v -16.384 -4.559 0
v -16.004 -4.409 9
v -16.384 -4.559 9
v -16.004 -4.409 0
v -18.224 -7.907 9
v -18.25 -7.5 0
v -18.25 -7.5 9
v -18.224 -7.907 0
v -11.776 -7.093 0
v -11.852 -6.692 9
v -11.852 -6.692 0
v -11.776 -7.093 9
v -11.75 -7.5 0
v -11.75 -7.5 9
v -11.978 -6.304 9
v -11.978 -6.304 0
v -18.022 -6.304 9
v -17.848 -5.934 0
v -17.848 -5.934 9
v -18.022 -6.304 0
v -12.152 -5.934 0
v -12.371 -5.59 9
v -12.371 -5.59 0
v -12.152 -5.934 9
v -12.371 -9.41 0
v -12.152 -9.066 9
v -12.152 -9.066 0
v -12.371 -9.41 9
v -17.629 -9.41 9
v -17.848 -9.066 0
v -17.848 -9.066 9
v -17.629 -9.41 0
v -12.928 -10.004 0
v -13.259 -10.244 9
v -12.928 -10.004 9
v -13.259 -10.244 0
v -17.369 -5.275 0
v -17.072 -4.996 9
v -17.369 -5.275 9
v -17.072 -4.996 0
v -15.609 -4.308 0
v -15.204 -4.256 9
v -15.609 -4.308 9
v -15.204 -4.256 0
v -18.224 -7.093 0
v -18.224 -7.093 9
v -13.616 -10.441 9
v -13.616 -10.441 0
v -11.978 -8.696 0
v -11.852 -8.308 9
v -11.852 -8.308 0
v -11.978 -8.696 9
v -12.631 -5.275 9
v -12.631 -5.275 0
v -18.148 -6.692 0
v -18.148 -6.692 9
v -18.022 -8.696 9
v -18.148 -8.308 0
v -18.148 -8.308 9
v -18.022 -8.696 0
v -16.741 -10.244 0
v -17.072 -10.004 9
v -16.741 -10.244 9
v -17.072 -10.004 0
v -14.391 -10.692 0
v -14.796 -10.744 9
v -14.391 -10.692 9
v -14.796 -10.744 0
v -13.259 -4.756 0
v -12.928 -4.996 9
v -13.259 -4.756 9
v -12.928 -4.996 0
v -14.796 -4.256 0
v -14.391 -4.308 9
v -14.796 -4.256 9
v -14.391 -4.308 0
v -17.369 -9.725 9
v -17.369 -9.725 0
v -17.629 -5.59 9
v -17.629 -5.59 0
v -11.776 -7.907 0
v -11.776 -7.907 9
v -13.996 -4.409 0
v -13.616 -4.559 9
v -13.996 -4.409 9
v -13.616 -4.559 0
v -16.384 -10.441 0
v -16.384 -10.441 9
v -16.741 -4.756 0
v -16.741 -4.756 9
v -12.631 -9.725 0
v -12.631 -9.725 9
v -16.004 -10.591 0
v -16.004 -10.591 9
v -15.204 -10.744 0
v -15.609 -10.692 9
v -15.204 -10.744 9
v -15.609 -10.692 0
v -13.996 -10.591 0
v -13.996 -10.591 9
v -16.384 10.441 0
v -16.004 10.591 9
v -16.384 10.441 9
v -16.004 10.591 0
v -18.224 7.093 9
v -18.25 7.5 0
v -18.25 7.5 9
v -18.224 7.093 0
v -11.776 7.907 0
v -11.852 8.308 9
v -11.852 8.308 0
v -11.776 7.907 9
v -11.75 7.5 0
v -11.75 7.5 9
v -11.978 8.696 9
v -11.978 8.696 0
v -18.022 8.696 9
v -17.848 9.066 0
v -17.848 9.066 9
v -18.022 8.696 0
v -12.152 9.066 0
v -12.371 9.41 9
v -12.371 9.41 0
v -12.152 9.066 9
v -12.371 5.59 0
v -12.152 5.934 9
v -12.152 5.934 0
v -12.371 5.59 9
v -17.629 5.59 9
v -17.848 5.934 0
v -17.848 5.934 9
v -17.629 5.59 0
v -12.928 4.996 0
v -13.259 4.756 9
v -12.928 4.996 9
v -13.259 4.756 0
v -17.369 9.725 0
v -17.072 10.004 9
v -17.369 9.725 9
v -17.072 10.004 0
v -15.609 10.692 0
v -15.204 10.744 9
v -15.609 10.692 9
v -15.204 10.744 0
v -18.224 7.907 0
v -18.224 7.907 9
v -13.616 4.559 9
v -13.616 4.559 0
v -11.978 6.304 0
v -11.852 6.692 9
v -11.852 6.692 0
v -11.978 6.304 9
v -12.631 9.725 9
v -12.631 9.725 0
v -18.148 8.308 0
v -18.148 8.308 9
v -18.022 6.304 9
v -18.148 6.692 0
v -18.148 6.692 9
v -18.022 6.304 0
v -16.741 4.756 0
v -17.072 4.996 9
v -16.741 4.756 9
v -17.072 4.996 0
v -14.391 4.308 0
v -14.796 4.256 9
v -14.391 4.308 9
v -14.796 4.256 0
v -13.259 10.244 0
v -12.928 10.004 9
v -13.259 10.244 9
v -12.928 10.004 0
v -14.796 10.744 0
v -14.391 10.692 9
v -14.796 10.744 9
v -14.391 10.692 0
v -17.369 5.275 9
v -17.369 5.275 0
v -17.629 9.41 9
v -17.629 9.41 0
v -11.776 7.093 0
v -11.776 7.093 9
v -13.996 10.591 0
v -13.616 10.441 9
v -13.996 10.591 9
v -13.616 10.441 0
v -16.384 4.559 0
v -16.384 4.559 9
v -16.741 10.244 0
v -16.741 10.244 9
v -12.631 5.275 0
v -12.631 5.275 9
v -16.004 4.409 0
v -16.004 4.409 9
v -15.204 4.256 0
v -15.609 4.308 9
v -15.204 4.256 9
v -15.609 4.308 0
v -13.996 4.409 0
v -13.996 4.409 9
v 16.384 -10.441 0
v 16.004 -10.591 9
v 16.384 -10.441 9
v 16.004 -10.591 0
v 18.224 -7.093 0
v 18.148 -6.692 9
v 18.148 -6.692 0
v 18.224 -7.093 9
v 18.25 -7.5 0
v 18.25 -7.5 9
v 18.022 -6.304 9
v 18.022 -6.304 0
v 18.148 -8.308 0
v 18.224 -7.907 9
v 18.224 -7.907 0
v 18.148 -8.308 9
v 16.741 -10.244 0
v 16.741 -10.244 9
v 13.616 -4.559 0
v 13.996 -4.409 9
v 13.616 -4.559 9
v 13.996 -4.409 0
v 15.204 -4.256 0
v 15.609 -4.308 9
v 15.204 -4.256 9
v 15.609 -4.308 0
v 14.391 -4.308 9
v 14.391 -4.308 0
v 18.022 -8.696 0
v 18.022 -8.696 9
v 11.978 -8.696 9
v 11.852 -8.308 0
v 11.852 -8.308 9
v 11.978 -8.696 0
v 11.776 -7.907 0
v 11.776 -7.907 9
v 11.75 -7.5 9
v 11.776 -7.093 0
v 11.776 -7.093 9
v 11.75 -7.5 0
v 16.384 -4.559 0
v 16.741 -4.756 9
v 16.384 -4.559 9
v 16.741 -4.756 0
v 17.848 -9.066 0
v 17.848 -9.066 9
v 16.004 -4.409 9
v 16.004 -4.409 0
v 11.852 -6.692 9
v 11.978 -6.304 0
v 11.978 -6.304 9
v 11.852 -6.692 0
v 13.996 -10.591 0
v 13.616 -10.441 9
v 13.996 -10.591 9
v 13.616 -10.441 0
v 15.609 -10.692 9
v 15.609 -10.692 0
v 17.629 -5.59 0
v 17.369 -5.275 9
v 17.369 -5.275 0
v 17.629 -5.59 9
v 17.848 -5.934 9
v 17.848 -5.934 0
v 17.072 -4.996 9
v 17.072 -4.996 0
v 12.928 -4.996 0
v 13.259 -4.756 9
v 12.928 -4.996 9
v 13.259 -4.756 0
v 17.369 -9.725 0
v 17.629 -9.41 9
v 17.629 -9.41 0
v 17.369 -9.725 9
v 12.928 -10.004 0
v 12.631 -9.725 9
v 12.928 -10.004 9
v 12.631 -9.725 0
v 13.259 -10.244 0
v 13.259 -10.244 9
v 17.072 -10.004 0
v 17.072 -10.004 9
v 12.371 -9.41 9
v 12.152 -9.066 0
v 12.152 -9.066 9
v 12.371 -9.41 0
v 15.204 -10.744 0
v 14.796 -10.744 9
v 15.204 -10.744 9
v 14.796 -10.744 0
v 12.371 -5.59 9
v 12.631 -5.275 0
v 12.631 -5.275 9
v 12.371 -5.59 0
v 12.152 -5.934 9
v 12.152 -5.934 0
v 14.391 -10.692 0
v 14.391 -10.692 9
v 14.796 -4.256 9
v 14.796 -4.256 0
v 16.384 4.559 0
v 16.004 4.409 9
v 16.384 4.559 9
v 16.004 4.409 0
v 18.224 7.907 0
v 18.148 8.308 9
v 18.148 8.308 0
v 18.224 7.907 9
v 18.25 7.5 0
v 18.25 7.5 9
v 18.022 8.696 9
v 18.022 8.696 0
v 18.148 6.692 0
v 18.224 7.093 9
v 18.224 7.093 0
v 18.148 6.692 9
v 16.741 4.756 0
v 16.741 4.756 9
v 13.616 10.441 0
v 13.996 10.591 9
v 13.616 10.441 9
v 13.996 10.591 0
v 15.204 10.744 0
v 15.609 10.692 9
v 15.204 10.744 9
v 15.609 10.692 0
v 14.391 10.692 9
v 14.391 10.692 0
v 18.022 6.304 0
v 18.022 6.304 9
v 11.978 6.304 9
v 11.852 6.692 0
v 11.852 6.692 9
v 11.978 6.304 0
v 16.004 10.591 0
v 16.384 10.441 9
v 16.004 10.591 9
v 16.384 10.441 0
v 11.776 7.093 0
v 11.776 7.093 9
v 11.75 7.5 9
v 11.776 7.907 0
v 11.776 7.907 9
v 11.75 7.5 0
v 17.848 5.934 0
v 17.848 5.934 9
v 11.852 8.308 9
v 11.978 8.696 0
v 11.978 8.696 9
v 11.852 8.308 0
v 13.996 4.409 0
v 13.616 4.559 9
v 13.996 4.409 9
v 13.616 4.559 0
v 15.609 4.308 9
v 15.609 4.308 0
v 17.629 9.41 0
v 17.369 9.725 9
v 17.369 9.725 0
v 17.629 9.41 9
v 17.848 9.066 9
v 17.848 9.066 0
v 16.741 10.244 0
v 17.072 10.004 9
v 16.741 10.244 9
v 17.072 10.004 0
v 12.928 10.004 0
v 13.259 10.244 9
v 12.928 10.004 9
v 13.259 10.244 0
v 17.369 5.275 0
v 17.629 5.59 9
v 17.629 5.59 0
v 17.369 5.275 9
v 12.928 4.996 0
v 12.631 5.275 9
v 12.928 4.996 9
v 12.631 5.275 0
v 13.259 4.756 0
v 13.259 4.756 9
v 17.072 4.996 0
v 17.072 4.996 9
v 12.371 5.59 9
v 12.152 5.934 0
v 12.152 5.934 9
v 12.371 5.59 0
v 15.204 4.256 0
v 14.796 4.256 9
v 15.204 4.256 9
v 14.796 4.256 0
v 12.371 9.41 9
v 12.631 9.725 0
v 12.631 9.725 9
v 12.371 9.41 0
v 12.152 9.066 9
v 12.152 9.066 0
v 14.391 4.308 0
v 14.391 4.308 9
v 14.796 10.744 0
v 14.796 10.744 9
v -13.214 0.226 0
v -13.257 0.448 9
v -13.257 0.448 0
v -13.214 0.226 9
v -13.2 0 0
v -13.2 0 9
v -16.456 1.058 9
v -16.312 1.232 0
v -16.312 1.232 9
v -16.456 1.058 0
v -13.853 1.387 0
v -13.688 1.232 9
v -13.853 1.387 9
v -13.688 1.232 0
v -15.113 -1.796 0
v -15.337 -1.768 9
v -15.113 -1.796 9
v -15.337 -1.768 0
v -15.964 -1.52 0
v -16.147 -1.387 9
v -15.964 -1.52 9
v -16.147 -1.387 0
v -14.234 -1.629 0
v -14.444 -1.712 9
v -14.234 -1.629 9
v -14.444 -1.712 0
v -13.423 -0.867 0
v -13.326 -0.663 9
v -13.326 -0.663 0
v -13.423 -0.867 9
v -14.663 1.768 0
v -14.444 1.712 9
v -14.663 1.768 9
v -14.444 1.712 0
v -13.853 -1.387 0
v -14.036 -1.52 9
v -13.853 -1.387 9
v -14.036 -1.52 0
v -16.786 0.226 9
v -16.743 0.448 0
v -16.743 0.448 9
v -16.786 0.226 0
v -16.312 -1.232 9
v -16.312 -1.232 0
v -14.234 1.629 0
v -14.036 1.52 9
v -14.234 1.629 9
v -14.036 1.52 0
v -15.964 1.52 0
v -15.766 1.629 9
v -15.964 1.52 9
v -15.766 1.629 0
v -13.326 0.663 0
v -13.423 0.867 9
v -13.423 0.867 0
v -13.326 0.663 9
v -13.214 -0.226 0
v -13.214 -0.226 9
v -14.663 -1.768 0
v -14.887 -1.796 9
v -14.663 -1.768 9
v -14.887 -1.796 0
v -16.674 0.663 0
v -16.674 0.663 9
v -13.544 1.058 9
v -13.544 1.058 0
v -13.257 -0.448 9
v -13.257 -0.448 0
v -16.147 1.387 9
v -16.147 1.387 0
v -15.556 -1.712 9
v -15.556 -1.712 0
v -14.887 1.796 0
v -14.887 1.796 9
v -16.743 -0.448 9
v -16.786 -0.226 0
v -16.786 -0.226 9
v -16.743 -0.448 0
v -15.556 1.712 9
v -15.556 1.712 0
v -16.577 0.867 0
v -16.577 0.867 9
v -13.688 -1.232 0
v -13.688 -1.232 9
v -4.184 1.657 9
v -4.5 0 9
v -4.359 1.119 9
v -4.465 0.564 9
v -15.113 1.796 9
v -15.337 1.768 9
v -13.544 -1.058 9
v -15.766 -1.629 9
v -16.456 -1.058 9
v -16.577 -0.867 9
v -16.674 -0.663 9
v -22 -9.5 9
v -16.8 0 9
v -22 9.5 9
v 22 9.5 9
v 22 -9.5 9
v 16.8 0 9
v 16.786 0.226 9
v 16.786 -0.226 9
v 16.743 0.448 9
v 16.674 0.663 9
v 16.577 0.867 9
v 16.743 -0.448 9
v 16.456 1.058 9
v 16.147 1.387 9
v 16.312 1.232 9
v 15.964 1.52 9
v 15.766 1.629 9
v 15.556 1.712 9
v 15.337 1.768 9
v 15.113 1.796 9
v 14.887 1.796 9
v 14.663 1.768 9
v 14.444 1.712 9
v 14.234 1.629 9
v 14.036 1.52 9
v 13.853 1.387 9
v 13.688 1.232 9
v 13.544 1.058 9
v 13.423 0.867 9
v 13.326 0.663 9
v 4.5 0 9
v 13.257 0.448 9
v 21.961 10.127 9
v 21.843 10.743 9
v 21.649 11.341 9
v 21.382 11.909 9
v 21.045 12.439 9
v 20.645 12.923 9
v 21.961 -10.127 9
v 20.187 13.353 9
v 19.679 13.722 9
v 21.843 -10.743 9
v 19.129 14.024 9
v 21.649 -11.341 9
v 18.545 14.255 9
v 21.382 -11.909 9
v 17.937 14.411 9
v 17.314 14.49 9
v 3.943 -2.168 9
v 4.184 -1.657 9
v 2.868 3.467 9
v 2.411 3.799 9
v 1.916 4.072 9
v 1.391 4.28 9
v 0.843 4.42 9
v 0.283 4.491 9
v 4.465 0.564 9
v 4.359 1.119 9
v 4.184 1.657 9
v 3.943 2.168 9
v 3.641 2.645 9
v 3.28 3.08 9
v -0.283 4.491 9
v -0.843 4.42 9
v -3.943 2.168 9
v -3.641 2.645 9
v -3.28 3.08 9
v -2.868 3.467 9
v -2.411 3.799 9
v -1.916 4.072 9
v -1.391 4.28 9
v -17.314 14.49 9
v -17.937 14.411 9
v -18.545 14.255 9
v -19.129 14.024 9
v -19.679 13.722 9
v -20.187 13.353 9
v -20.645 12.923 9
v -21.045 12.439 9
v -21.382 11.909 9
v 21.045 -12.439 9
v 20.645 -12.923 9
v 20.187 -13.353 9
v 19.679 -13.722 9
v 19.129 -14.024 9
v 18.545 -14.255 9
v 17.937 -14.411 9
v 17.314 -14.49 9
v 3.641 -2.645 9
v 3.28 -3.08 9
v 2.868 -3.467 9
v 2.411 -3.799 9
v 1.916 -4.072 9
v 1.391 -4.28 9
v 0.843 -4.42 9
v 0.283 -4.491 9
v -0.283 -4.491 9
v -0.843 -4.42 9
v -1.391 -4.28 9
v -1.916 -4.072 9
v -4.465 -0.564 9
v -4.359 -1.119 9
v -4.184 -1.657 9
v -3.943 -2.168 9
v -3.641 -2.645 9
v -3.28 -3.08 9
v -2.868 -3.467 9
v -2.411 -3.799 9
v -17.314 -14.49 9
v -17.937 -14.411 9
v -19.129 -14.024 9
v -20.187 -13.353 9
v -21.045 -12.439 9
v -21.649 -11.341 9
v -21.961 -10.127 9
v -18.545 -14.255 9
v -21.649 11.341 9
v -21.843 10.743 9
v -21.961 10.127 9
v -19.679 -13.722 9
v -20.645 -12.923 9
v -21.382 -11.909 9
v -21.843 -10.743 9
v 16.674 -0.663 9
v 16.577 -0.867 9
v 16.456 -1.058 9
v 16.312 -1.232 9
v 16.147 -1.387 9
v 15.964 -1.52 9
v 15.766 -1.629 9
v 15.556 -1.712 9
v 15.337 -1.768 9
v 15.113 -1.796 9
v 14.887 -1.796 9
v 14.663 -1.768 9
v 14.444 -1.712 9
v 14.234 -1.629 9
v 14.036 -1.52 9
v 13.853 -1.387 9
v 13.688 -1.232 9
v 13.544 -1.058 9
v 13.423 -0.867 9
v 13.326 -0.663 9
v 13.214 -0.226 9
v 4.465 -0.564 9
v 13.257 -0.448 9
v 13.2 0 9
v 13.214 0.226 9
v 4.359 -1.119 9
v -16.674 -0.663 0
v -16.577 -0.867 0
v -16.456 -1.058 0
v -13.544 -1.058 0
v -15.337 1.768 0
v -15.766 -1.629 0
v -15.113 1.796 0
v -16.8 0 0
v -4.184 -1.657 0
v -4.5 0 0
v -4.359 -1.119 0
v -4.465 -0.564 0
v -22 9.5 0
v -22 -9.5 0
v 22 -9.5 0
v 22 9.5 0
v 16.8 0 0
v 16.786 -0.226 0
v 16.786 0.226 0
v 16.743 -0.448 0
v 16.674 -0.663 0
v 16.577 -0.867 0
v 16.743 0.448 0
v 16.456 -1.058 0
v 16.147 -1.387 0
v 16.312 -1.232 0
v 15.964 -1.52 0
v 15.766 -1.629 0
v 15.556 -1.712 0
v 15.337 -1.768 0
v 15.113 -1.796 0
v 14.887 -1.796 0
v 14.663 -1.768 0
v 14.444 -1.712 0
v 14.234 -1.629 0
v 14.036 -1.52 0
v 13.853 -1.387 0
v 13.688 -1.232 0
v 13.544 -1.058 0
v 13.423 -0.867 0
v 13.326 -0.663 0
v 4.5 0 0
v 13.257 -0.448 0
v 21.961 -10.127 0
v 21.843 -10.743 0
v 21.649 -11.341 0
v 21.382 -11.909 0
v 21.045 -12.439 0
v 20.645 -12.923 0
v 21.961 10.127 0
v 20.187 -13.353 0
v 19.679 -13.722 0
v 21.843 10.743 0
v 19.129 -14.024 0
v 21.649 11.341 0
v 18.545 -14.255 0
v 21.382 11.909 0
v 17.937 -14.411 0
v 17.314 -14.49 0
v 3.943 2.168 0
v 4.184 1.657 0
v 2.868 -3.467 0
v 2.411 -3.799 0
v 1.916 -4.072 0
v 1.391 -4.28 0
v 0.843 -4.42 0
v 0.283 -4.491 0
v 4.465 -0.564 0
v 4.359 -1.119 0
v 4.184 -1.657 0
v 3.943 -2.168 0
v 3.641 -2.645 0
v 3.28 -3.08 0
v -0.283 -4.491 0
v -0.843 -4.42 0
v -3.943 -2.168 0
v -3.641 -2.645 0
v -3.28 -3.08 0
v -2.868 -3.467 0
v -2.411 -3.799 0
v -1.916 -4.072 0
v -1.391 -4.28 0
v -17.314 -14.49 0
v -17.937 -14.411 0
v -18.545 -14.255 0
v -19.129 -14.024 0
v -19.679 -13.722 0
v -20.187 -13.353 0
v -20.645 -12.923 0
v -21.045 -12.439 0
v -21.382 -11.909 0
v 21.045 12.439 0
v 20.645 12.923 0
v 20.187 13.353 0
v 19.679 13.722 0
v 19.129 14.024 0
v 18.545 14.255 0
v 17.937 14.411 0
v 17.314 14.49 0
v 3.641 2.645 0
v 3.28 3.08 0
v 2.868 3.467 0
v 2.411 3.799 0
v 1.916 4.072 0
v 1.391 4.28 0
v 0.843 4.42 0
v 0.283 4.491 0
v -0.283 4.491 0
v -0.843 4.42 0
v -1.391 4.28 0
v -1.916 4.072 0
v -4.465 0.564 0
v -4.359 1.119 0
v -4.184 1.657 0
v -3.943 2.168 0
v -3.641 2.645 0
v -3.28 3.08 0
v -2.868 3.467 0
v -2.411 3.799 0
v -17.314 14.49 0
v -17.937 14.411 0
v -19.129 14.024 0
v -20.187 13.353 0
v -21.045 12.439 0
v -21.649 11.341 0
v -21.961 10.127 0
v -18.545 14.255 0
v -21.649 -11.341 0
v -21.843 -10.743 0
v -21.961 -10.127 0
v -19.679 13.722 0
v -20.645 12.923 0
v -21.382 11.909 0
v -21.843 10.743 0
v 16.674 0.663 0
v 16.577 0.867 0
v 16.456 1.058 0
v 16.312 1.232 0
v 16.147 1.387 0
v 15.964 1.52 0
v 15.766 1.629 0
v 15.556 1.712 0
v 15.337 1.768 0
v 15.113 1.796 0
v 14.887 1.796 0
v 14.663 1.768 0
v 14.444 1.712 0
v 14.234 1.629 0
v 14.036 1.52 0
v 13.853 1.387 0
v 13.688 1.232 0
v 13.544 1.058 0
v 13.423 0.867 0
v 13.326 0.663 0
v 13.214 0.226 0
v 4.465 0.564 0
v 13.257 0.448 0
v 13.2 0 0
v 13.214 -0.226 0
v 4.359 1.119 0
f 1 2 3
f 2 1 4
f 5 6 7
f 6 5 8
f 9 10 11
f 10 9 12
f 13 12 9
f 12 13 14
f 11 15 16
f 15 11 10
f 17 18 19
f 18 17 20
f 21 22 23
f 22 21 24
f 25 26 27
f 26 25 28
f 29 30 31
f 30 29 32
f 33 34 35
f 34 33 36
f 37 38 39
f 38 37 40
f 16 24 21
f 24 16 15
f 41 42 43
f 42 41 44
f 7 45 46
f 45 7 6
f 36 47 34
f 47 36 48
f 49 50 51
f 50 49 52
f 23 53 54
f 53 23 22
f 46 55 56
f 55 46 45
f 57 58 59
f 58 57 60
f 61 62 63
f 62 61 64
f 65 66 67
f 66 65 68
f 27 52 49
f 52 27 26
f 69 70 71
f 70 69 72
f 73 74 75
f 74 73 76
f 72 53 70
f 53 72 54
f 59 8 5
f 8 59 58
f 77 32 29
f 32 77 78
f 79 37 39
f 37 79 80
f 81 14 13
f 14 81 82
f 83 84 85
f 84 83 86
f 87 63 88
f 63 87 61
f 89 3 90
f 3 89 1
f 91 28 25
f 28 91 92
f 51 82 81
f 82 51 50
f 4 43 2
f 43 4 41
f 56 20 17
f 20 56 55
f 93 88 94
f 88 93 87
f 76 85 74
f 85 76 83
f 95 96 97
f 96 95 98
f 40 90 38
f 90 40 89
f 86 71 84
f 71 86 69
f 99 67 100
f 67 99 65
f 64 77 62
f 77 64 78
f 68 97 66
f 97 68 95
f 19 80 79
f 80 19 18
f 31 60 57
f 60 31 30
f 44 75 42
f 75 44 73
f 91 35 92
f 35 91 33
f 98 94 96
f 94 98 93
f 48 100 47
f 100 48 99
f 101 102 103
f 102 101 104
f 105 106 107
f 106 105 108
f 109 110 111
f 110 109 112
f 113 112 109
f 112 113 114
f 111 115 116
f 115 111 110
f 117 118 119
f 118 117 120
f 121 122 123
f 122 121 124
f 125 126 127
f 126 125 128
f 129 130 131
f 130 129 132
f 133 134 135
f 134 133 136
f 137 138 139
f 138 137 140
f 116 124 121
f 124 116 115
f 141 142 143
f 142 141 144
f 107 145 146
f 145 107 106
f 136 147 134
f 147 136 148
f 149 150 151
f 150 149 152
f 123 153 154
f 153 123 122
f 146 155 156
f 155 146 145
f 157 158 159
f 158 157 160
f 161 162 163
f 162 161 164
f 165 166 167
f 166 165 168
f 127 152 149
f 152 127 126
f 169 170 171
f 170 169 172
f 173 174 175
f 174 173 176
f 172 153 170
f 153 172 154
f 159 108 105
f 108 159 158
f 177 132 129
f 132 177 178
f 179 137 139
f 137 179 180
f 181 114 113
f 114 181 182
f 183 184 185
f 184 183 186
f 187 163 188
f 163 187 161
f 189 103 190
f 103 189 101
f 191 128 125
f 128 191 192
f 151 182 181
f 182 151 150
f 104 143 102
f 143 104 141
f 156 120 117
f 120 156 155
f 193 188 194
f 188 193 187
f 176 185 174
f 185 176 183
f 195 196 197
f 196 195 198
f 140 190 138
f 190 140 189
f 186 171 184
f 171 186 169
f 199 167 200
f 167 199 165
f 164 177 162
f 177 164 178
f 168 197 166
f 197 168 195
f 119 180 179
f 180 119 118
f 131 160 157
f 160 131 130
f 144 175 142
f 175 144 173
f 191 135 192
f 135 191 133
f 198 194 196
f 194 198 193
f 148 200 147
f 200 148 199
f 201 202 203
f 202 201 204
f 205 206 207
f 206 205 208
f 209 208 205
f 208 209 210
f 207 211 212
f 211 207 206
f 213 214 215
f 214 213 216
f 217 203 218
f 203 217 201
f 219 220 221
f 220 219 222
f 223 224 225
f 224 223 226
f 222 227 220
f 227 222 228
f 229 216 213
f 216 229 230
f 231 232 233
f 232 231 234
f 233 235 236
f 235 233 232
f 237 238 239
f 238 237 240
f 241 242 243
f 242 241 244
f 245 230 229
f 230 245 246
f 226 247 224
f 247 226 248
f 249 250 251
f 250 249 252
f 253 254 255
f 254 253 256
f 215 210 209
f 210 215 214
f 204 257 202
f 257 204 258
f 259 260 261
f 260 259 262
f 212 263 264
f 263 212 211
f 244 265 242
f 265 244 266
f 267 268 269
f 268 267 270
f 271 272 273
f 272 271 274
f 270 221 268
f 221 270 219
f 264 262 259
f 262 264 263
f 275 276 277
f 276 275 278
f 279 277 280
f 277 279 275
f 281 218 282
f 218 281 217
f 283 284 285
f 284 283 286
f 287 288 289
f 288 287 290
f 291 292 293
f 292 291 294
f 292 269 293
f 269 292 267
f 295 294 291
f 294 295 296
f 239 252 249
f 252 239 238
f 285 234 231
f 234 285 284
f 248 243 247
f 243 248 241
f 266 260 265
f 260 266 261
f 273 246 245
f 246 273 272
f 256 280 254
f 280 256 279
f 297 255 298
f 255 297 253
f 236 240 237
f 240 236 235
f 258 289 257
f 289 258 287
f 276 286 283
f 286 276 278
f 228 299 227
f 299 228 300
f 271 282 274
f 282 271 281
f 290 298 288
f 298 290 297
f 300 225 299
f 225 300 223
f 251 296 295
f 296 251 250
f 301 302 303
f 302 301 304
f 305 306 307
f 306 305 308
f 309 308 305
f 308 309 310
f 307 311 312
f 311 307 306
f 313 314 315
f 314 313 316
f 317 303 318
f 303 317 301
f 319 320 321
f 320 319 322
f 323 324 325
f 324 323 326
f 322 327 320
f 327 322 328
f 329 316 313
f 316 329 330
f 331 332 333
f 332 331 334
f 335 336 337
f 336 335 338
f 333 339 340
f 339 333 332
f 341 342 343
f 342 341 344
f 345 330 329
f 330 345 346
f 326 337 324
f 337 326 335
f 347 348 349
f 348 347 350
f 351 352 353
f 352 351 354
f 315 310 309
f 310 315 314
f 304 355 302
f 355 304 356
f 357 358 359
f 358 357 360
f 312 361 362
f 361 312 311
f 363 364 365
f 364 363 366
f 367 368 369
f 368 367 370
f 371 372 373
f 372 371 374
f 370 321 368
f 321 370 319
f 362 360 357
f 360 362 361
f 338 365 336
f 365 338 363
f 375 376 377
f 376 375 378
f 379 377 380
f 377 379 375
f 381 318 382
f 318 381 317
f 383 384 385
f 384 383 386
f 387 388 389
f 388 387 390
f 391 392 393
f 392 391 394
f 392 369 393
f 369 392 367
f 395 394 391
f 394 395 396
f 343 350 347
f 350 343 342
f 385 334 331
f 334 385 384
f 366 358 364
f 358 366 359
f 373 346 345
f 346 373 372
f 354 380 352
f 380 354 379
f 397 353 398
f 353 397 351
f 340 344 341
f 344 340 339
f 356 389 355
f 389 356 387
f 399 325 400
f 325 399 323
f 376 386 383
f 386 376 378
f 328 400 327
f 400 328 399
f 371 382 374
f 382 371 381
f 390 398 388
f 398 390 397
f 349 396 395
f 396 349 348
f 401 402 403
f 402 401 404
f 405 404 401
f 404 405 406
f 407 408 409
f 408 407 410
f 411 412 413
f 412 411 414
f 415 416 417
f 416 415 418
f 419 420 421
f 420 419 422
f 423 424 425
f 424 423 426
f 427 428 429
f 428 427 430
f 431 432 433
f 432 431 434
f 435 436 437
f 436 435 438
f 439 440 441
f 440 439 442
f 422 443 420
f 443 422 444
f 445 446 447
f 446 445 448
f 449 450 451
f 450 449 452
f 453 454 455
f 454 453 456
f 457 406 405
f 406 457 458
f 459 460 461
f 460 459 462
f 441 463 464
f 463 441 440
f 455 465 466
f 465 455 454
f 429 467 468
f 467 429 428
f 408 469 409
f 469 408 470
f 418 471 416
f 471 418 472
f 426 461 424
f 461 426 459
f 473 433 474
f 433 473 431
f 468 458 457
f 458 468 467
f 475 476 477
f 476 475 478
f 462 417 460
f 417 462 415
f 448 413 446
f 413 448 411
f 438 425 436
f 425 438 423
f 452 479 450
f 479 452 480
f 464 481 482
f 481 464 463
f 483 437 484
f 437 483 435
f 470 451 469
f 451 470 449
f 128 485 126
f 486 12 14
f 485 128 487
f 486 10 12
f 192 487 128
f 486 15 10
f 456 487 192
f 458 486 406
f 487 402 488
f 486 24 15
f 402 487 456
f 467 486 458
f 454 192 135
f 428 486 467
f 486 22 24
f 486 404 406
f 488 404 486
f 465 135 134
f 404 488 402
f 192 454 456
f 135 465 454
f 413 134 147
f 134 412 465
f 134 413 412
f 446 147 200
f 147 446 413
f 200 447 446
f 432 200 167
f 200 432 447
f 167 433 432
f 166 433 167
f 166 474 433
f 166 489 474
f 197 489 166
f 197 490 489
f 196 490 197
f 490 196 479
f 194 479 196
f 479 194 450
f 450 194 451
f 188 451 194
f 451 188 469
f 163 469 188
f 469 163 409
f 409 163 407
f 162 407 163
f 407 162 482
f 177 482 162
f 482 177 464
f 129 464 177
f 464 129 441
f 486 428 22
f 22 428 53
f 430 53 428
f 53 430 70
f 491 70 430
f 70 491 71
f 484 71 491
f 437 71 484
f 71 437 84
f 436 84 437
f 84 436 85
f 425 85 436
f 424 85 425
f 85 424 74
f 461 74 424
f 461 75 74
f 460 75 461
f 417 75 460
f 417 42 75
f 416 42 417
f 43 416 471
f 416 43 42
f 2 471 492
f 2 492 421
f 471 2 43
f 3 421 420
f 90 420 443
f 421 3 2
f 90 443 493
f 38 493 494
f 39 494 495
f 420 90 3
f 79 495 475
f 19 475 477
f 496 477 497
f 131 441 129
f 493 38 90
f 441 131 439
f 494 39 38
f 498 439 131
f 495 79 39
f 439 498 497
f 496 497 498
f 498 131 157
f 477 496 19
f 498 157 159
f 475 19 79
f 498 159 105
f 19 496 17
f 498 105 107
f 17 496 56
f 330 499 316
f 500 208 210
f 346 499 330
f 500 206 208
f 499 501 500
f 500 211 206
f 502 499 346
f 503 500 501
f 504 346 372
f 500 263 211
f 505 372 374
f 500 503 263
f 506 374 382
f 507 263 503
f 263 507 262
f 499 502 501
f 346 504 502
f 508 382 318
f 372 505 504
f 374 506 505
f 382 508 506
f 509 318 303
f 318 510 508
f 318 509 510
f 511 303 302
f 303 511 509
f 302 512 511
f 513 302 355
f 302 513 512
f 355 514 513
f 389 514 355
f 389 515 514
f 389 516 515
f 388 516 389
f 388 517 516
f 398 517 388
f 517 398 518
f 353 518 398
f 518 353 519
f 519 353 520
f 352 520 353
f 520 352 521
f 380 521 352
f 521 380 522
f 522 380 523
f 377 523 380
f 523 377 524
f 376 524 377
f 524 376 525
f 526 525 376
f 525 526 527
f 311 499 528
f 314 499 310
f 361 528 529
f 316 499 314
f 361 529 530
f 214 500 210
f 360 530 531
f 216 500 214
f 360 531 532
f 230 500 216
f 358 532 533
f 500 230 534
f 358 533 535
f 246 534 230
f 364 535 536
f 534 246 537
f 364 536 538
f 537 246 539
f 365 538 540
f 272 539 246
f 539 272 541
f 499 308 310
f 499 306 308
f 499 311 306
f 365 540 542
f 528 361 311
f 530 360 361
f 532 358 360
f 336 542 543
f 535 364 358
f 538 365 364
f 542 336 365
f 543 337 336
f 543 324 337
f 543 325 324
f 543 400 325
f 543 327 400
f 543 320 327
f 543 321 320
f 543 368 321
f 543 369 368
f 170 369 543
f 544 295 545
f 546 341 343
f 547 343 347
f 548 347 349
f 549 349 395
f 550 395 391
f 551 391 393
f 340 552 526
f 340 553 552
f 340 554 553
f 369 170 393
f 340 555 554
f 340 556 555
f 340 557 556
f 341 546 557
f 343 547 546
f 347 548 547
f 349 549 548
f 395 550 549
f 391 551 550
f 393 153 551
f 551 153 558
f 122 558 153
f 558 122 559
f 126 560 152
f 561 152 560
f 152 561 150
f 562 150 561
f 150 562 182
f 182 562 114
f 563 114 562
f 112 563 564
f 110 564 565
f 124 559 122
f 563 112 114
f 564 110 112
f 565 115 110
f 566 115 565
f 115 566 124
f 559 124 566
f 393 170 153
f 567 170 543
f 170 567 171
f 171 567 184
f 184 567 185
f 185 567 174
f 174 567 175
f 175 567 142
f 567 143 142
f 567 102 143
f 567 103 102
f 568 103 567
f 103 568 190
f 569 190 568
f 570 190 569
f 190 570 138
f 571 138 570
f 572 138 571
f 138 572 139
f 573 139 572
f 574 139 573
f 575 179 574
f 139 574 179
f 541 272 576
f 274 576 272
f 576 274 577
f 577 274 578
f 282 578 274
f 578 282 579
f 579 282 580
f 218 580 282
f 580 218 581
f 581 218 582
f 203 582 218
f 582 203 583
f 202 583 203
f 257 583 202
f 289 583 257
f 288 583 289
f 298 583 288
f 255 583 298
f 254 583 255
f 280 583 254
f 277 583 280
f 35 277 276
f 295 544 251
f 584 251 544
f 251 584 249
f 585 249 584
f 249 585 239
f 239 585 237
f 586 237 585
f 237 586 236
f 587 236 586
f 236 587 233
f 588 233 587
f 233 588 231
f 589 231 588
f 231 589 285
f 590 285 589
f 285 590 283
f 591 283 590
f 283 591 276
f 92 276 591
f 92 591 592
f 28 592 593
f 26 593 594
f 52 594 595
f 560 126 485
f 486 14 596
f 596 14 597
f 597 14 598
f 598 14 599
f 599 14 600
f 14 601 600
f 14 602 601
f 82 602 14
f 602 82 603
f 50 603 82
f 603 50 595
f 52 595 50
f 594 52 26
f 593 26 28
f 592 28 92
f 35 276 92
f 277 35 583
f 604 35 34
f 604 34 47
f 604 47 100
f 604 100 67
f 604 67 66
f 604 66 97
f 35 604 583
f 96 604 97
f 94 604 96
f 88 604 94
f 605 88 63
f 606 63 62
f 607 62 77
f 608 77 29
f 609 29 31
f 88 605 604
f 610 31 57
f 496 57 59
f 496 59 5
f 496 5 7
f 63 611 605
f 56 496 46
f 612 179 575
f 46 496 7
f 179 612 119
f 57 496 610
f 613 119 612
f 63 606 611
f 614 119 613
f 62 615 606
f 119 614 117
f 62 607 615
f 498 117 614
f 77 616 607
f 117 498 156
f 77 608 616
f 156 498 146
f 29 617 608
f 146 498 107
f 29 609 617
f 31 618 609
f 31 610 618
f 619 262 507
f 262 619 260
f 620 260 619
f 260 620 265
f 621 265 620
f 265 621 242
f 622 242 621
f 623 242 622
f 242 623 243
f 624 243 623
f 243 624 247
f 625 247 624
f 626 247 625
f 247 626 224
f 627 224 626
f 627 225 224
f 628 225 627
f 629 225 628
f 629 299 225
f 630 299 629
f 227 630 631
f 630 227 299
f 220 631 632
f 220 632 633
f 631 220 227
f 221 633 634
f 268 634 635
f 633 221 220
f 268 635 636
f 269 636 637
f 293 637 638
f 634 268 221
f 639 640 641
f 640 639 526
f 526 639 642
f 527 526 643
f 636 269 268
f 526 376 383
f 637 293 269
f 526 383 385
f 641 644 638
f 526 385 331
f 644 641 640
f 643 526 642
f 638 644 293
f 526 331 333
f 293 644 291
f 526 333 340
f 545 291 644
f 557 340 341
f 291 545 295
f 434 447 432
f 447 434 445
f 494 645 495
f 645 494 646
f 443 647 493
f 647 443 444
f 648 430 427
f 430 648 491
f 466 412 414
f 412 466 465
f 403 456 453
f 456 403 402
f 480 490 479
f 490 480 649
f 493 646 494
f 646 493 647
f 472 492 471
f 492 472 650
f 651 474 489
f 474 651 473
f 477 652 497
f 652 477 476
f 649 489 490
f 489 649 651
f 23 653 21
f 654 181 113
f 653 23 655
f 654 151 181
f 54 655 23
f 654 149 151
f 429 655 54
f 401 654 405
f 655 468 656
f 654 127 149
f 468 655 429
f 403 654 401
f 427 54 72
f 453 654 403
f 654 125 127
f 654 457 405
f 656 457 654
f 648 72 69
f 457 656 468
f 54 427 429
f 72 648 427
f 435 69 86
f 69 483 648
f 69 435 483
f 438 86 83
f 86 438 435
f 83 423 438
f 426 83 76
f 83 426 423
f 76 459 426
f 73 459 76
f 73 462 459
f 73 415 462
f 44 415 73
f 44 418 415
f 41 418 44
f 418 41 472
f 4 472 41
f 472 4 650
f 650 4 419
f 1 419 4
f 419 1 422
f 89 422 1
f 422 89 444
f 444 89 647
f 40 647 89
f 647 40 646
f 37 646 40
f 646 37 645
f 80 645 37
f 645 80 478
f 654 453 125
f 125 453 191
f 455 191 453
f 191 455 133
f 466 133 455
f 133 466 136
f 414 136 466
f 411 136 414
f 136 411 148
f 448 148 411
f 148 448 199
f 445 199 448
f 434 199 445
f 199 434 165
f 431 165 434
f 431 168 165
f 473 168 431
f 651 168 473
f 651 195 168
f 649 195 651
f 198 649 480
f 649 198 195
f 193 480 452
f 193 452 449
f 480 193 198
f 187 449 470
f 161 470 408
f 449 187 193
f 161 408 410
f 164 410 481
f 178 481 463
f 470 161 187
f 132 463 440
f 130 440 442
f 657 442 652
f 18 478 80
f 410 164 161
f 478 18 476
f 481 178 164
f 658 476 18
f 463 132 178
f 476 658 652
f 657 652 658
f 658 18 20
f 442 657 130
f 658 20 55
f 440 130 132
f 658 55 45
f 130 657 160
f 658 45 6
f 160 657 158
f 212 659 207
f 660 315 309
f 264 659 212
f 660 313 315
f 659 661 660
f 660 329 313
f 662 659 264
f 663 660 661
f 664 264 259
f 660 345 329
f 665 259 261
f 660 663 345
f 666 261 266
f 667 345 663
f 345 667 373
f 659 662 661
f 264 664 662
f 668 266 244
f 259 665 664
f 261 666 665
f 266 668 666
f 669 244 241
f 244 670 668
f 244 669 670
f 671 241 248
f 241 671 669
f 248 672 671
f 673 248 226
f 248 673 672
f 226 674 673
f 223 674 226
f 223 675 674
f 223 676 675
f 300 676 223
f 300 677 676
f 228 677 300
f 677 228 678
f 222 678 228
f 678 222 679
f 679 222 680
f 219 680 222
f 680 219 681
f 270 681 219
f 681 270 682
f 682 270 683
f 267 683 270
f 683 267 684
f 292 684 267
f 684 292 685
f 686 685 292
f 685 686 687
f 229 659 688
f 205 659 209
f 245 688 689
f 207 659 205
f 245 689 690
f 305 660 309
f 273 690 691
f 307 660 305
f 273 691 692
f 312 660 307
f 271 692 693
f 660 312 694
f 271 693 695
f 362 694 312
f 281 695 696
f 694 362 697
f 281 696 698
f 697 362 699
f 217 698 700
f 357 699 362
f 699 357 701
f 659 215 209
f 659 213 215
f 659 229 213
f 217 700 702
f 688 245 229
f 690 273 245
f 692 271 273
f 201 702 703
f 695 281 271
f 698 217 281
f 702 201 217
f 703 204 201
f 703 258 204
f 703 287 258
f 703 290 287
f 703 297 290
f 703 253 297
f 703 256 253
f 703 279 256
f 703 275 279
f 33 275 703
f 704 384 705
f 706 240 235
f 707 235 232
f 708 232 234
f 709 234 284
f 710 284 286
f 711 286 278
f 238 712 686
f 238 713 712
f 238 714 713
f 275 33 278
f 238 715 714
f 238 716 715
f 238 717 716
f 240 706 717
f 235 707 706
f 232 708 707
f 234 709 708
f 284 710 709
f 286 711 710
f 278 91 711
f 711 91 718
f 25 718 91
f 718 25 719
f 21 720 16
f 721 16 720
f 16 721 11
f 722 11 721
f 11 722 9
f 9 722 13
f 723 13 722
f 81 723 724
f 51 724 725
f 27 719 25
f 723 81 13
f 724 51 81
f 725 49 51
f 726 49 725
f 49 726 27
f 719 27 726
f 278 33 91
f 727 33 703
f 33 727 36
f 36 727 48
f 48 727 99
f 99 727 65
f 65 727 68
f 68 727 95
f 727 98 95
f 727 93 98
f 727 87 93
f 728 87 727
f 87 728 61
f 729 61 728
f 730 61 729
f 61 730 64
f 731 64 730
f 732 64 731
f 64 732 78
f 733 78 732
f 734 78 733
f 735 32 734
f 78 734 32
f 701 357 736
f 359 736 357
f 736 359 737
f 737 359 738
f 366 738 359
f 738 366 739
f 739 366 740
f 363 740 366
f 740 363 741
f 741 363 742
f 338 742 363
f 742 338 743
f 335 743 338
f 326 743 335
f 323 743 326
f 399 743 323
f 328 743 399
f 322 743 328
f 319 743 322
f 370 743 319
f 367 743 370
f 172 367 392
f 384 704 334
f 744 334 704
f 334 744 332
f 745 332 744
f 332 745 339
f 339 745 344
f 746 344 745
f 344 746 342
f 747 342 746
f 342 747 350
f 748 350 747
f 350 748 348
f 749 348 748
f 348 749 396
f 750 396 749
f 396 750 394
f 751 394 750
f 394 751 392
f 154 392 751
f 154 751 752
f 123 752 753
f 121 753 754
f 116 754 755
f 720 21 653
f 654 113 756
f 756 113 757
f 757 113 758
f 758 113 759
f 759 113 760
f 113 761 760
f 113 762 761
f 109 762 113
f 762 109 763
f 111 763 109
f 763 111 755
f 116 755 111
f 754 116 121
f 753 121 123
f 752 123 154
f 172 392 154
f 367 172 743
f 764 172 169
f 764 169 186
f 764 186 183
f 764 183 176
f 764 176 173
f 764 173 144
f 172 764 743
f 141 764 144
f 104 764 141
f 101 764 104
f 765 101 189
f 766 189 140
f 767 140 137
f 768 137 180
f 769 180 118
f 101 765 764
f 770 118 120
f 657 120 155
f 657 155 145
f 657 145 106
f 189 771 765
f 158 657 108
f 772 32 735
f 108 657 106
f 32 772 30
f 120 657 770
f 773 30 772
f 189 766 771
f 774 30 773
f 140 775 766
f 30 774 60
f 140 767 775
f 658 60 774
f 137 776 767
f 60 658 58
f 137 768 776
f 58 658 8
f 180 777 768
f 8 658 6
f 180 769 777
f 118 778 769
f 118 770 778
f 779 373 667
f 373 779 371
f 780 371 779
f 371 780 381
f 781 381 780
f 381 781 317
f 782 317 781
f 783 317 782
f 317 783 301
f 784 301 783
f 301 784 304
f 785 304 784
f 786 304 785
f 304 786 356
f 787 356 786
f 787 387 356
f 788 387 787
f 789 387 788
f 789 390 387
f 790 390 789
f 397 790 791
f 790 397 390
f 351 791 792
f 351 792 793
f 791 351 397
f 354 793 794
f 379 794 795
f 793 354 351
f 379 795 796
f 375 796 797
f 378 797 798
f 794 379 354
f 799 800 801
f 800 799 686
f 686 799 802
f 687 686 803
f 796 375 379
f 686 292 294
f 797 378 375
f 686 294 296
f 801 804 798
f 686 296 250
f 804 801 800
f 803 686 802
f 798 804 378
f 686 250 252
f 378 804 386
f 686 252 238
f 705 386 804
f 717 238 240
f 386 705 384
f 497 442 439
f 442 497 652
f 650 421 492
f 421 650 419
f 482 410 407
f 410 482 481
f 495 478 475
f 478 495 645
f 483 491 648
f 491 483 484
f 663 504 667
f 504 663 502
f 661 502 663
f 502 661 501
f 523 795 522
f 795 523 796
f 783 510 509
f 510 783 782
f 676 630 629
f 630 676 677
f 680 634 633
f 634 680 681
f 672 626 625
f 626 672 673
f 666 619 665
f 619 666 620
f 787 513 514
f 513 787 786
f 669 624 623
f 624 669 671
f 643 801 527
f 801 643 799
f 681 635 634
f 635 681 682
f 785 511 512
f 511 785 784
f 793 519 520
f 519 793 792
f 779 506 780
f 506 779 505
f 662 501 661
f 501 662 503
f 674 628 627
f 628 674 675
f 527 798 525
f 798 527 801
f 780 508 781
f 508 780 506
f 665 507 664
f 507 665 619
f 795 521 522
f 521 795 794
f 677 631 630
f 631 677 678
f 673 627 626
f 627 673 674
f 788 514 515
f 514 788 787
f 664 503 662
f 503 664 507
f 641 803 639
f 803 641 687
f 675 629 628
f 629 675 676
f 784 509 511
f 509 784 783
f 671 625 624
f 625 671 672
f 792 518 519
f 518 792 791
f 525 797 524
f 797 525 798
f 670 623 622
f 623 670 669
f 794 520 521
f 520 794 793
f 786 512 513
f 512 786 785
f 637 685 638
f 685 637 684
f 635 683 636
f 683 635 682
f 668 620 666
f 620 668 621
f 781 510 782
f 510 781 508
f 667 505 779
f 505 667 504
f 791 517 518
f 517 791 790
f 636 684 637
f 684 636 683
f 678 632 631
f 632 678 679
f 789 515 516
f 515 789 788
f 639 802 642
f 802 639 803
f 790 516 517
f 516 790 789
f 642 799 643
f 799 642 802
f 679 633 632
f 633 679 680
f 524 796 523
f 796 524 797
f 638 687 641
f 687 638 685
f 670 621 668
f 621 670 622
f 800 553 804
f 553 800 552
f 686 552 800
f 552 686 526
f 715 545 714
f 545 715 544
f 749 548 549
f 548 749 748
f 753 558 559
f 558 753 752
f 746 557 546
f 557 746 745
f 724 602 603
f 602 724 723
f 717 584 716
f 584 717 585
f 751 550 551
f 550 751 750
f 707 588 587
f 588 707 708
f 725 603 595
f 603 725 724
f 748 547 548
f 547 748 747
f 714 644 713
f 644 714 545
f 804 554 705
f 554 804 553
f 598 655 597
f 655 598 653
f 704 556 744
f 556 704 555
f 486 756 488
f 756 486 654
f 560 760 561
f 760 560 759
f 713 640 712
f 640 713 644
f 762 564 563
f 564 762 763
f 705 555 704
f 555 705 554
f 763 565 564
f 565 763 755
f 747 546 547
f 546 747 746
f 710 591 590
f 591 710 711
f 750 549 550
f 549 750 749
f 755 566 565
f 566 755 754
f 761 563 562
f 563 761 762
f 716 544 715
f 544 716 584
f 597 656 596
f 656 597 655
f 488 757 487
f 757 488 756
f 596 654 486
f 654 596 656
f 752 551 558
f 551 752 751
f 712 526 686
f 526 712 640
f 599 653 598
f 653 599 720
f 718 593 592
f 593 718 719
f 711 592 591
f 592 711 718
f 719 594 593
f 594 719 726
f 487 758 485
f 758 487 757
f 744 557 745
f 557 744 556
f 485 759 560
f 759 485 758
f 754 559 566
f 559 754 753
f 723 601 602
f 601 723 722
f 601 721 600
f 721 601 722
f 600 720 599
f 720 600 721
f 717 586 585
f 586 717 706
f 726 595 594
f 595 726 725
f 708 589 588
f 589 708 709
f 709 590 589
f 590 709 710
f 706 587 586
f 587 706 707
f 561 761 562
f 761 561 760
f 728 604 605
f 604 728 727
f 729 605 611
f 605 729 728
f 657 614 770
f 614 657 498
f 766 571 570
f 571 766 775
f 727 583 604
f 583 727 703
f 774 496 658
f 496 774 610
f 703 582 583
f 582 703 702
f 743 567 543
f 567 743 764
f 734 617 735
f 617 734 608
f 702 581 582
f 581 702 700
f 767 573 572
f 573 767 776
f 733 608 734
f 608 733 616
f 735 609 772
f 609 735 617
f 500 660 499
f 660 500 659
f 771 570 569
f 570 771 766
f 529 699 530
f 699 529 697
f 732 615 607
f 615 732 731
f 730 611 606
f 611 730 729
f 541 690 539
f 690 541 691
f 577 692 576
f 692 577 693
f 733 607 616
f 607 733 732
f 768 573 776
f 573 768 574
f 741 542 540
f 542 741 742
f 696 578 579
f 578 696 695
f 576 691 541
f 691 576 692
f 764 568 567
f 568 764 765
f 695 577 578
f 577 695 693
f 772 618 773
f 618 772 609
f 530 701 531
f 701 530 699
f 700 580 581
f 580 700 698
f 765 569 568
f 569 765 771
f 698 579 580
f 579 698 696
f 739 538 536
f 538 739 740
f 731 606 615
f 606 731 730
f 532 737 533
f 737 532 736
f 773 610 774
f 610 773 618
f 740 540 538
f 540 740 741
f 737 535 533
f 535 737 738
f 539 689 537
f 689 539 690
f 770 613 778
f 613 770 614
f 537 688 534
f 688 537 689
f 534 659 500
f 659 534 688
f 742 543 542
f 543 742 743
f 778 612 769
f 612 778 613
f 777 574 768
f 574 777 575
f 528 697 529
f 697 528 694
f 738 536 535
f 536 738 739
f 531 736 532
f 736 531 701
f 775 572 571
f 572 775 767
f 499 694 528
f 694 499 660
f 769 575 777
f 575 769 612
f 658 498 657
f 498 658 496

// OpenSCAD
$fn = 50;


difference() {
	union() {
		hull() {
			translate(v = [-17.0000000000, 9.5000000000, 0]) {
				cylinder(h = 9, r = 5);
			}
			translate(v = [17.0000000000, 9.5000000000, 0]) {
				cylinder(h = 9, r = 5);
			}
			translate(v = [-17.0000000000, -9.5000000000, 0]) {
				cylinder(h = 9, r = 5);
			}
			translate(v = [17.0000000000, -9.5000000000, 0]) {
				cylinder(h = 9, r = 5);
			}
		}
	}
	union() {
		#translate(v = [-15.0000000000, -7.5000000000, 0]) {
			cylinder(h = 9, r = 3.2500000000);
		}
		#translate(v = [-15.0000000000, 7.5000000000, 0]) {
			cylinder(h = 9, r = 3.2500000000);
		}
		#translate(v = [15.0000000000, -7.5000000000, 0]) {
			cylinder(h = 9, r = 3.2500000000);
		}
		#translate(v = [15.0000000000, 7.5000000000, 0]) {
			cylinder(h = 9, r = 3.2500000000);
		}
		#translate(v = [-15.0000000000, -7.5000000000, -100.0000000000]) {
			cylinder(h = 200, r = 3.2500000000);
		}
		#translate(v = [-15.0000000000, 7.5000000000, -100.0000000000]) {
			cylinder(h = 200, r = 3.2500000000);
		}
		#translate(v = [15.0000000000, -7.5000000000, -100.0000000000]) {
			cylinder(h = 200, r = 3.2500000000);
		}
		#translate(v = [15.0000000000, 7.5000000000, -100.0000000000]) {
			cylinder(h = 200, r = 3.2500000000);
		}
		#translate(v = [-15.0000000000, -7.5000000000, 0]) {
			cylinder(h = 9, r = 1.8000000000);
		}
		#translate(v = [-15.0000000000, 0.0000000000, 0]) {
			cylinder(h = 9, r = 1.8000000000);
		}
		#translate(v = [-15.0000000000, 7.5000000000, 0]) {
			cylinder(h = 9, r = 1.8000000000);
		}
		#translate(v = [15.0000000000, -7.5000000000, 0]) {
			cylinder(h = 9, r = 1.8000000000);
		}
		#translate(v = [15.0000000000, 0.0000000000, 0]) {
			cylinder(h = 9, r = 1.8000000000);
		}
		#translate(v = [15.0000000000, 7.5000000000, 0]) {
			cylinder(h = 9, r = 1.8000000000);
		}
		#translate(v = [-15.0000000000, -7.5000000000, 0]) {
			cylinder(h = 9, r = 1.8000000000);
		}
		#translate(v = [-15.0000000000, 0.0000000000, 0]) {
			cylinder(h = 9, r = 1.8000000000);
		}
		#translate(v = [-15.0000000000, 7.5000000000, 0]) {
			cylinder(h = 9, r = 1.8000000000);
		}
		#translate(v = [15.0000000000, -7.5000000000, 0]) {
			cylinder(h = 9, r = 1.8000000000);
		}
		#translate(v = [15.0000000000, 0.0000000000, 0]) {
			cylinder(h = 9, r = 1.8000000000);
		}
		#translate(v = [15.0000000000, 7.5000000000, 0]) {
			cylinder(h = 9, r = 1.8000000000);
		}
		#translate(v = [-15.0000000000, -7.5000000000, 0]) {
			cylinder(h = 9, r = 1.8000000000);
		}
		#translate(v = [-15.0000000000, 0.0000000000, 0]) {
			cylinder(h = 9, r = 1.8000000000);
		}
		#translate(v = [-15.0000000000, 7.5000000000, 0]) {
			cylinder(h = 9, r = 1.8000000000);
		}
		#translate(v = [15.0000000000, -7.5000000000, 0]) {
			cylinder(h = 9, r = 1.8000000000);
		}
		#translate(v = [15.0000000000, 0.0000000000, 0]) {
			cylinder(h = 9, r = 1.8000000000);
		}
		#translate(v = [15.0000000000, 7.5000000000, 0]) {
			cylinder(h = 9, r = 1.8000000000);
		}
		#cylinder(h = 9, r = 4.5000000000);
	}
}
